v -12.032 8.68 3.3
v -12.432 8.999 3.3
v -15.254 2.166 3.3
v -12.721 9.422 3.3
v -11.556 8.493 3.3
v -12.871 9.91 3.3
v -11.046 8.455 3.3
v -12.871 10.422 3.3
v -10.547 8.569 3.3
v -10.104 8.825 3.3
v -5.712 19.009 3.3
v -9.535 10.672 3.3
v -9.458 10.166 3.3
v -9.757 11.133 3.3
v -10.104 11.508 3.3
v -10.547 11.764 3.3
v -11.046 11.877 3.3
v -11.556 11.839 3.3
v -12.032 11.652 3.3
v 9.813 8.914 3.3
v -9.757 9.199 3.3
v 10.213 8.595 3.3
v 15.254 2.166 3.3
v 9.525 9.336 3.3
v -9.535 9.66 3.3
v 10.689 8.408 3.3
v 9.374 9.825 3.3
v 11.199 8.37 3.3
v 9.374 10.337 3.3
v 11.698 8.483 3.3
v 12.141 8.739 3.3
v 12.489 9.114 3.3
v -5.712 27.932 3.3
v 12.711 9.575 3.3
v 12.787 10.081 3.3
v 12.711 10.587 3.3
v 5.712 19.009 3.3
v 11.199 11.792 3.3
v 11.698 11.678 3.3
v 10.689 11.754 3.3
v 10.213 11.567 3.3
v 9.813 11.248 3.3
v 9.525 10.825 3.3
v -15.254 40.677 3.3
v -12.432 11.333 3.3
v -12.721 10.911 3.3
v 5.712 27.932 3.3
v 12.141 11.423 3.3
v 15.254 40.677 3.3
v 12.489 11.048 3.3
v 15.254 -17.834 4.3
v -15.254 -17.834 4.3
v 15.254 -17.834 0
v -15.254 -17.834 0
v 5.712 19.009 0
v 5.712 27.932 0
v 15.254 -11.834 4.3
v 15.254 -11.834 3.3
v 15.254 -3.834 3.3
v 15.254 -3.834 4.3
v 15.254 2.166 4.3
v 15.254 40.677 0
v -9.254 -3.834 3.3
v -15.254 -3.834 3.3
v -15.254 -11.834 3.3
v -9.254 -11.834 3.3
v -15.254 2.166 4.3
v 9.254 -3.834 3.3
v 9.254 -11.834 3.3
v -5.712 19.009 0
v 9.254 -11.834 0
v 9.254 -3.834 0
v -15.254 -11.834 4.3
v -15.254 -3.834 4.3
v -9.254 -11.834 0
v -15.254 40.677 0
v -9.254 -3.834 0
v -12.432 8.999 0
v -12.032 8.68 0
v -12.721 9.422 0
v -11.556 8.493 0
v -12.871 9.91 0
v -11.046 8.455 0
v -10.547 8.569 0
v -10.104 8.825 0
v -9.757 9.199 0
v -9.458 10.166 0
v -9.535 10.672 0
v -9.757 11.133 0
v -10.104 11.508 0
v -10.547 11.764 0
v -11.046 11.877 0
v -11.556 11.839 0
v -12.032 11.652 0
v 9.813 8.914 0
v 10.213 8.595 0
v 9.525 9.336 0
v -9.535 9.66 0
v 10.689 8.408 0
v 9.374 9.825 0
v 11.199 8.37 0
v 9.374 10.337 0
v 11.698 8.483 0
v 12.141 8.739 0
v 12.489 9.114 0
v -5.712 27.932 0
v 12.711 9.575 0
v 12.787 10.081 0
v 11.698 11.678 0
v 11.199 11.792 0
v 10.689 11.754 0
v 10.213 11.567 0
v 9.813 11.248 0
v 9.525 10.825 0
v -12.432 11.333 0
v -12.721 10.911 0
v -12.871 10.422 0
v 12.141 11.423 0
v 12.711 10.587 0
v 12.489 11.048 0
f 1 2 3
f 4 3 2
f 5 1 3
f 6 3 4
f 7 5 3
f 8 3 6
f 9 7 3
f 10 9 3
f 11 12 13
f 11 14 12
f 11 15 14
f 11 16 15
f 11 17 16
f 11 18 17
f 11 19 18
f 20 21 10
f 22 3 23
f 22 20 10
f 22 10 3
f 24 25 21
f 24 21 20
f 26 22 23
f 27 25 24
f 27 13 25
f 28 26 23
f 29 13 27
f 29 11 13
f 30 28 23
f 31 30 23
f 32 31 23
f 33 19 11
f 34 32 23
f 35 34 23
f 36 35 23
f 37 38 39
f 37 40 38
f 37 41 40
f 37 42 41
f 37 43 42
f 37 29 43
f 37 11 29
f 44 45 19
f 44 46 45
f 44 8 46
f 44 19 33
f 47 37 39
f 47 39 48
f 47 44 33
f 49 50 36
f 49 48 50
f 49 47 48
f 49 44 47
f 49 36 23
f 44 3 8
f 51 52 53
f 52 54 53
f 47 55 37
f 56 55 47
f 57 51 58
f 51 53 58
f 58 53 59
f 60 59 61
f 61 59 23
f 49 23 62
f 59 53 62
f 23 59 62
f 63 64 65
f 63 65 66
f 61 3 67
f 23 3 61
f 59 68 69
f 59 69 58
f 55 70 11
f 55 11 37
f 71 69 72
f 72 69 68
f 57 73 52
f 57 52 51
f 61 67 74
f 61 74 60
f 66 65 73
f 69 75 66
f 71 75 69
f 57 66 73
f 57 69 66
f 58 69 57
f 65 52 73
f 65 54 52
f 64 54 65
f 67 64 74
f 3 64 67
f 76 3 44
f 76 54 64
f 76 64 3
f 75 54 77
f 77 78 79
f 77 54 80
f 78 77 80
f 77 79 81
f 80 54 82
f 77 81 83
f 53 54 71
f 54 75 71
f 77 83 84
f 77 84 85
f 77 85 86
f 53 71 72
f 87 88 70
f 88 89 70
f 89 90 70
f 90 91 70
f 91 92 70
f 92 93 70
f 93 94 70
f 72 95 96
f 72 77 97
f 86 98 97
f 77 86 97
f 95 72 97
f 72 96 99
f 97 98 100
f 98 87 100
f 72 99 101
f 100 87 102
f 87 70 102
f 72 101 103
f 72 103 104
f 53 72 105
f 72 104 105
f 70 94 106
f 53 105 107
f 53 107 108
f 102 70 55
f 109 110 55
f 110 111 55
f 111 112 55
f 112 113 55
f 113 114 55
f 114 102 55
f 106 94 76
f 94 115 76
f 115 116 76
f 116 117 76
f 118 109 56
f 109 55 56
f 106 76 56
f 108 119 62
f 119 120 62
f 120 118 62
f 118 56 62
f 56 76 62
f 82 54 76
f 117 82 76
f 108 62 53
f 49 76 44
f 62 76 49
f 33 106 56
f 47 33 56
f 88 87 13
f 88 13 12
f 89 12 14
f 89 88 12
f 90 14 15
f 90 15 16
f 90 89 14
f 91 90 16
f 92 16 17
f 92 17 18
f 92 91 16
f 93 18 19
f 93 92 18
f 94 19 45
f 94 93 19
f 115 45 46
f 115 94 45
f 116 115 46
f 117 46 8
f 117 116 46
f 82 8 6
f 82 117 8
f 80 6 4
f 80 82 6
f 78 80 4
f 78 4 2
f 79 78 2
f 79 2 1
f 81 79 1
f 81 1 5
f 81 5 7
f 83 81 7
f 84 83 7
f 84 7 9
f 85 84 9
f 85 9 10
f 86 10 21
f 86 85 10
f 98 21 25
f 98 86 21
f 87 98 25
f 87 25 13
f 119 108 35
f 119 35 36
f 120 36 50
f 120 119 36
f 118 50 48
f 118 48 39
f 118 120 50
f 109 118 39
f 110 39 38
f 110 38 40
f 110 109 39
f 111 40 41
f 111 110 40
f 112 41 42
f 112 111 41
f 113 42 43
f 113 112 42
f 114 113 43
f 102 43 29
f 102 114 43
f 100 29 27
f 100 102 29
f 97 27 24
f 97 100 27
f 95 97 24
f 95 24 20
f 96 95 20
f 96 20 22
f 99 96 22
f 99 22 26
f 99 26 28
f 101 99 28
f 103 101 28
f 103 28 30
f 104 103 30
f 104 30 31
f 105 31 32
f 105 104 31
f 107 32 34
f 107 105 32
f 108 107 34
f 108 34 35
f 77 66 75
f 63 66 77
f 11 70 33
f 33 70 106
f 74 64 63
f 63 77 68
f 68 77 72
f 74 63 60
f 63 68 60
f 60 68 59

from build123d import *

# Parameters (mm, degrees)
SKETCH_1_W          = 30.50790567
SKETCH_1_H          = 58.511029644
SKETCH_1_R          = 1.716069694
SKETCH_1_W_2        = 11.42456148
SKETCH_1_H_2        = 8.922497171
EXTRUDE_1_DEPTH     = 3.3
SKETCH_2_W          = 30.50790567
SKETCH_2_H          = 6
EXTRUDE_2_DEPTH     = 1
SKETCH_3_W          = 18.50790567
SKETCH_3_H          = 8
CUT_EXTRUDE_1_DEPTH = 3.3


with BuildPart() as part:
    # 草圖1 → 填料-伸長1 (new body)
    with BuildSketch(Plane.XY):
        with Locations((0, 11.421692739)):
            Rectangle(SKETCH_1_W, SKETCH_1_H)
        with Locations((-11.174415212, 10.166177917)):
            Circle(SKETCH_1_R, mode=Mode.SUBTRACT)
        with Locations((11.070768934, 10.080826612)):
            Circle(SKETCH_1_R, mode=Mode.SUBTRACT)
        with Locations((0, 23.470612751)):
            Rectangle(SKETCH_1_W_2, SKETCH_1_H_2, mode=Mode.SUBTRACT)
    extrude(amount=EXTRUDE_1_DEPTH)

    # 草圖2 → 填料-伸長2 (add)
    with BuildSketch(Plane.XY.offset(3.3)):
        with Locations((0, -0.833822083)):
            Rectangle(SKETCH_2_W, SKETCH_2_H)
        with Locations((0, -14.833822083)):
            Rectangle(SKETCH_2_W, SKETCH_2_H)
    extrude(amount=EXTRUDE_2_DEPTH)

    # 草圖3 → 除料-伸長1 (cut)
    with BuildSketch(Plane.XY.offset(3.3)):
        with Locations((0, -7.833822083)):
            Rectangle(SKETCH_3_W, SKETCH_3_H)
    extrude(amount=-CUT_EXTRUDE_1_DEPTH, mode=Mode.SUBTRACT)


solid = part.part
